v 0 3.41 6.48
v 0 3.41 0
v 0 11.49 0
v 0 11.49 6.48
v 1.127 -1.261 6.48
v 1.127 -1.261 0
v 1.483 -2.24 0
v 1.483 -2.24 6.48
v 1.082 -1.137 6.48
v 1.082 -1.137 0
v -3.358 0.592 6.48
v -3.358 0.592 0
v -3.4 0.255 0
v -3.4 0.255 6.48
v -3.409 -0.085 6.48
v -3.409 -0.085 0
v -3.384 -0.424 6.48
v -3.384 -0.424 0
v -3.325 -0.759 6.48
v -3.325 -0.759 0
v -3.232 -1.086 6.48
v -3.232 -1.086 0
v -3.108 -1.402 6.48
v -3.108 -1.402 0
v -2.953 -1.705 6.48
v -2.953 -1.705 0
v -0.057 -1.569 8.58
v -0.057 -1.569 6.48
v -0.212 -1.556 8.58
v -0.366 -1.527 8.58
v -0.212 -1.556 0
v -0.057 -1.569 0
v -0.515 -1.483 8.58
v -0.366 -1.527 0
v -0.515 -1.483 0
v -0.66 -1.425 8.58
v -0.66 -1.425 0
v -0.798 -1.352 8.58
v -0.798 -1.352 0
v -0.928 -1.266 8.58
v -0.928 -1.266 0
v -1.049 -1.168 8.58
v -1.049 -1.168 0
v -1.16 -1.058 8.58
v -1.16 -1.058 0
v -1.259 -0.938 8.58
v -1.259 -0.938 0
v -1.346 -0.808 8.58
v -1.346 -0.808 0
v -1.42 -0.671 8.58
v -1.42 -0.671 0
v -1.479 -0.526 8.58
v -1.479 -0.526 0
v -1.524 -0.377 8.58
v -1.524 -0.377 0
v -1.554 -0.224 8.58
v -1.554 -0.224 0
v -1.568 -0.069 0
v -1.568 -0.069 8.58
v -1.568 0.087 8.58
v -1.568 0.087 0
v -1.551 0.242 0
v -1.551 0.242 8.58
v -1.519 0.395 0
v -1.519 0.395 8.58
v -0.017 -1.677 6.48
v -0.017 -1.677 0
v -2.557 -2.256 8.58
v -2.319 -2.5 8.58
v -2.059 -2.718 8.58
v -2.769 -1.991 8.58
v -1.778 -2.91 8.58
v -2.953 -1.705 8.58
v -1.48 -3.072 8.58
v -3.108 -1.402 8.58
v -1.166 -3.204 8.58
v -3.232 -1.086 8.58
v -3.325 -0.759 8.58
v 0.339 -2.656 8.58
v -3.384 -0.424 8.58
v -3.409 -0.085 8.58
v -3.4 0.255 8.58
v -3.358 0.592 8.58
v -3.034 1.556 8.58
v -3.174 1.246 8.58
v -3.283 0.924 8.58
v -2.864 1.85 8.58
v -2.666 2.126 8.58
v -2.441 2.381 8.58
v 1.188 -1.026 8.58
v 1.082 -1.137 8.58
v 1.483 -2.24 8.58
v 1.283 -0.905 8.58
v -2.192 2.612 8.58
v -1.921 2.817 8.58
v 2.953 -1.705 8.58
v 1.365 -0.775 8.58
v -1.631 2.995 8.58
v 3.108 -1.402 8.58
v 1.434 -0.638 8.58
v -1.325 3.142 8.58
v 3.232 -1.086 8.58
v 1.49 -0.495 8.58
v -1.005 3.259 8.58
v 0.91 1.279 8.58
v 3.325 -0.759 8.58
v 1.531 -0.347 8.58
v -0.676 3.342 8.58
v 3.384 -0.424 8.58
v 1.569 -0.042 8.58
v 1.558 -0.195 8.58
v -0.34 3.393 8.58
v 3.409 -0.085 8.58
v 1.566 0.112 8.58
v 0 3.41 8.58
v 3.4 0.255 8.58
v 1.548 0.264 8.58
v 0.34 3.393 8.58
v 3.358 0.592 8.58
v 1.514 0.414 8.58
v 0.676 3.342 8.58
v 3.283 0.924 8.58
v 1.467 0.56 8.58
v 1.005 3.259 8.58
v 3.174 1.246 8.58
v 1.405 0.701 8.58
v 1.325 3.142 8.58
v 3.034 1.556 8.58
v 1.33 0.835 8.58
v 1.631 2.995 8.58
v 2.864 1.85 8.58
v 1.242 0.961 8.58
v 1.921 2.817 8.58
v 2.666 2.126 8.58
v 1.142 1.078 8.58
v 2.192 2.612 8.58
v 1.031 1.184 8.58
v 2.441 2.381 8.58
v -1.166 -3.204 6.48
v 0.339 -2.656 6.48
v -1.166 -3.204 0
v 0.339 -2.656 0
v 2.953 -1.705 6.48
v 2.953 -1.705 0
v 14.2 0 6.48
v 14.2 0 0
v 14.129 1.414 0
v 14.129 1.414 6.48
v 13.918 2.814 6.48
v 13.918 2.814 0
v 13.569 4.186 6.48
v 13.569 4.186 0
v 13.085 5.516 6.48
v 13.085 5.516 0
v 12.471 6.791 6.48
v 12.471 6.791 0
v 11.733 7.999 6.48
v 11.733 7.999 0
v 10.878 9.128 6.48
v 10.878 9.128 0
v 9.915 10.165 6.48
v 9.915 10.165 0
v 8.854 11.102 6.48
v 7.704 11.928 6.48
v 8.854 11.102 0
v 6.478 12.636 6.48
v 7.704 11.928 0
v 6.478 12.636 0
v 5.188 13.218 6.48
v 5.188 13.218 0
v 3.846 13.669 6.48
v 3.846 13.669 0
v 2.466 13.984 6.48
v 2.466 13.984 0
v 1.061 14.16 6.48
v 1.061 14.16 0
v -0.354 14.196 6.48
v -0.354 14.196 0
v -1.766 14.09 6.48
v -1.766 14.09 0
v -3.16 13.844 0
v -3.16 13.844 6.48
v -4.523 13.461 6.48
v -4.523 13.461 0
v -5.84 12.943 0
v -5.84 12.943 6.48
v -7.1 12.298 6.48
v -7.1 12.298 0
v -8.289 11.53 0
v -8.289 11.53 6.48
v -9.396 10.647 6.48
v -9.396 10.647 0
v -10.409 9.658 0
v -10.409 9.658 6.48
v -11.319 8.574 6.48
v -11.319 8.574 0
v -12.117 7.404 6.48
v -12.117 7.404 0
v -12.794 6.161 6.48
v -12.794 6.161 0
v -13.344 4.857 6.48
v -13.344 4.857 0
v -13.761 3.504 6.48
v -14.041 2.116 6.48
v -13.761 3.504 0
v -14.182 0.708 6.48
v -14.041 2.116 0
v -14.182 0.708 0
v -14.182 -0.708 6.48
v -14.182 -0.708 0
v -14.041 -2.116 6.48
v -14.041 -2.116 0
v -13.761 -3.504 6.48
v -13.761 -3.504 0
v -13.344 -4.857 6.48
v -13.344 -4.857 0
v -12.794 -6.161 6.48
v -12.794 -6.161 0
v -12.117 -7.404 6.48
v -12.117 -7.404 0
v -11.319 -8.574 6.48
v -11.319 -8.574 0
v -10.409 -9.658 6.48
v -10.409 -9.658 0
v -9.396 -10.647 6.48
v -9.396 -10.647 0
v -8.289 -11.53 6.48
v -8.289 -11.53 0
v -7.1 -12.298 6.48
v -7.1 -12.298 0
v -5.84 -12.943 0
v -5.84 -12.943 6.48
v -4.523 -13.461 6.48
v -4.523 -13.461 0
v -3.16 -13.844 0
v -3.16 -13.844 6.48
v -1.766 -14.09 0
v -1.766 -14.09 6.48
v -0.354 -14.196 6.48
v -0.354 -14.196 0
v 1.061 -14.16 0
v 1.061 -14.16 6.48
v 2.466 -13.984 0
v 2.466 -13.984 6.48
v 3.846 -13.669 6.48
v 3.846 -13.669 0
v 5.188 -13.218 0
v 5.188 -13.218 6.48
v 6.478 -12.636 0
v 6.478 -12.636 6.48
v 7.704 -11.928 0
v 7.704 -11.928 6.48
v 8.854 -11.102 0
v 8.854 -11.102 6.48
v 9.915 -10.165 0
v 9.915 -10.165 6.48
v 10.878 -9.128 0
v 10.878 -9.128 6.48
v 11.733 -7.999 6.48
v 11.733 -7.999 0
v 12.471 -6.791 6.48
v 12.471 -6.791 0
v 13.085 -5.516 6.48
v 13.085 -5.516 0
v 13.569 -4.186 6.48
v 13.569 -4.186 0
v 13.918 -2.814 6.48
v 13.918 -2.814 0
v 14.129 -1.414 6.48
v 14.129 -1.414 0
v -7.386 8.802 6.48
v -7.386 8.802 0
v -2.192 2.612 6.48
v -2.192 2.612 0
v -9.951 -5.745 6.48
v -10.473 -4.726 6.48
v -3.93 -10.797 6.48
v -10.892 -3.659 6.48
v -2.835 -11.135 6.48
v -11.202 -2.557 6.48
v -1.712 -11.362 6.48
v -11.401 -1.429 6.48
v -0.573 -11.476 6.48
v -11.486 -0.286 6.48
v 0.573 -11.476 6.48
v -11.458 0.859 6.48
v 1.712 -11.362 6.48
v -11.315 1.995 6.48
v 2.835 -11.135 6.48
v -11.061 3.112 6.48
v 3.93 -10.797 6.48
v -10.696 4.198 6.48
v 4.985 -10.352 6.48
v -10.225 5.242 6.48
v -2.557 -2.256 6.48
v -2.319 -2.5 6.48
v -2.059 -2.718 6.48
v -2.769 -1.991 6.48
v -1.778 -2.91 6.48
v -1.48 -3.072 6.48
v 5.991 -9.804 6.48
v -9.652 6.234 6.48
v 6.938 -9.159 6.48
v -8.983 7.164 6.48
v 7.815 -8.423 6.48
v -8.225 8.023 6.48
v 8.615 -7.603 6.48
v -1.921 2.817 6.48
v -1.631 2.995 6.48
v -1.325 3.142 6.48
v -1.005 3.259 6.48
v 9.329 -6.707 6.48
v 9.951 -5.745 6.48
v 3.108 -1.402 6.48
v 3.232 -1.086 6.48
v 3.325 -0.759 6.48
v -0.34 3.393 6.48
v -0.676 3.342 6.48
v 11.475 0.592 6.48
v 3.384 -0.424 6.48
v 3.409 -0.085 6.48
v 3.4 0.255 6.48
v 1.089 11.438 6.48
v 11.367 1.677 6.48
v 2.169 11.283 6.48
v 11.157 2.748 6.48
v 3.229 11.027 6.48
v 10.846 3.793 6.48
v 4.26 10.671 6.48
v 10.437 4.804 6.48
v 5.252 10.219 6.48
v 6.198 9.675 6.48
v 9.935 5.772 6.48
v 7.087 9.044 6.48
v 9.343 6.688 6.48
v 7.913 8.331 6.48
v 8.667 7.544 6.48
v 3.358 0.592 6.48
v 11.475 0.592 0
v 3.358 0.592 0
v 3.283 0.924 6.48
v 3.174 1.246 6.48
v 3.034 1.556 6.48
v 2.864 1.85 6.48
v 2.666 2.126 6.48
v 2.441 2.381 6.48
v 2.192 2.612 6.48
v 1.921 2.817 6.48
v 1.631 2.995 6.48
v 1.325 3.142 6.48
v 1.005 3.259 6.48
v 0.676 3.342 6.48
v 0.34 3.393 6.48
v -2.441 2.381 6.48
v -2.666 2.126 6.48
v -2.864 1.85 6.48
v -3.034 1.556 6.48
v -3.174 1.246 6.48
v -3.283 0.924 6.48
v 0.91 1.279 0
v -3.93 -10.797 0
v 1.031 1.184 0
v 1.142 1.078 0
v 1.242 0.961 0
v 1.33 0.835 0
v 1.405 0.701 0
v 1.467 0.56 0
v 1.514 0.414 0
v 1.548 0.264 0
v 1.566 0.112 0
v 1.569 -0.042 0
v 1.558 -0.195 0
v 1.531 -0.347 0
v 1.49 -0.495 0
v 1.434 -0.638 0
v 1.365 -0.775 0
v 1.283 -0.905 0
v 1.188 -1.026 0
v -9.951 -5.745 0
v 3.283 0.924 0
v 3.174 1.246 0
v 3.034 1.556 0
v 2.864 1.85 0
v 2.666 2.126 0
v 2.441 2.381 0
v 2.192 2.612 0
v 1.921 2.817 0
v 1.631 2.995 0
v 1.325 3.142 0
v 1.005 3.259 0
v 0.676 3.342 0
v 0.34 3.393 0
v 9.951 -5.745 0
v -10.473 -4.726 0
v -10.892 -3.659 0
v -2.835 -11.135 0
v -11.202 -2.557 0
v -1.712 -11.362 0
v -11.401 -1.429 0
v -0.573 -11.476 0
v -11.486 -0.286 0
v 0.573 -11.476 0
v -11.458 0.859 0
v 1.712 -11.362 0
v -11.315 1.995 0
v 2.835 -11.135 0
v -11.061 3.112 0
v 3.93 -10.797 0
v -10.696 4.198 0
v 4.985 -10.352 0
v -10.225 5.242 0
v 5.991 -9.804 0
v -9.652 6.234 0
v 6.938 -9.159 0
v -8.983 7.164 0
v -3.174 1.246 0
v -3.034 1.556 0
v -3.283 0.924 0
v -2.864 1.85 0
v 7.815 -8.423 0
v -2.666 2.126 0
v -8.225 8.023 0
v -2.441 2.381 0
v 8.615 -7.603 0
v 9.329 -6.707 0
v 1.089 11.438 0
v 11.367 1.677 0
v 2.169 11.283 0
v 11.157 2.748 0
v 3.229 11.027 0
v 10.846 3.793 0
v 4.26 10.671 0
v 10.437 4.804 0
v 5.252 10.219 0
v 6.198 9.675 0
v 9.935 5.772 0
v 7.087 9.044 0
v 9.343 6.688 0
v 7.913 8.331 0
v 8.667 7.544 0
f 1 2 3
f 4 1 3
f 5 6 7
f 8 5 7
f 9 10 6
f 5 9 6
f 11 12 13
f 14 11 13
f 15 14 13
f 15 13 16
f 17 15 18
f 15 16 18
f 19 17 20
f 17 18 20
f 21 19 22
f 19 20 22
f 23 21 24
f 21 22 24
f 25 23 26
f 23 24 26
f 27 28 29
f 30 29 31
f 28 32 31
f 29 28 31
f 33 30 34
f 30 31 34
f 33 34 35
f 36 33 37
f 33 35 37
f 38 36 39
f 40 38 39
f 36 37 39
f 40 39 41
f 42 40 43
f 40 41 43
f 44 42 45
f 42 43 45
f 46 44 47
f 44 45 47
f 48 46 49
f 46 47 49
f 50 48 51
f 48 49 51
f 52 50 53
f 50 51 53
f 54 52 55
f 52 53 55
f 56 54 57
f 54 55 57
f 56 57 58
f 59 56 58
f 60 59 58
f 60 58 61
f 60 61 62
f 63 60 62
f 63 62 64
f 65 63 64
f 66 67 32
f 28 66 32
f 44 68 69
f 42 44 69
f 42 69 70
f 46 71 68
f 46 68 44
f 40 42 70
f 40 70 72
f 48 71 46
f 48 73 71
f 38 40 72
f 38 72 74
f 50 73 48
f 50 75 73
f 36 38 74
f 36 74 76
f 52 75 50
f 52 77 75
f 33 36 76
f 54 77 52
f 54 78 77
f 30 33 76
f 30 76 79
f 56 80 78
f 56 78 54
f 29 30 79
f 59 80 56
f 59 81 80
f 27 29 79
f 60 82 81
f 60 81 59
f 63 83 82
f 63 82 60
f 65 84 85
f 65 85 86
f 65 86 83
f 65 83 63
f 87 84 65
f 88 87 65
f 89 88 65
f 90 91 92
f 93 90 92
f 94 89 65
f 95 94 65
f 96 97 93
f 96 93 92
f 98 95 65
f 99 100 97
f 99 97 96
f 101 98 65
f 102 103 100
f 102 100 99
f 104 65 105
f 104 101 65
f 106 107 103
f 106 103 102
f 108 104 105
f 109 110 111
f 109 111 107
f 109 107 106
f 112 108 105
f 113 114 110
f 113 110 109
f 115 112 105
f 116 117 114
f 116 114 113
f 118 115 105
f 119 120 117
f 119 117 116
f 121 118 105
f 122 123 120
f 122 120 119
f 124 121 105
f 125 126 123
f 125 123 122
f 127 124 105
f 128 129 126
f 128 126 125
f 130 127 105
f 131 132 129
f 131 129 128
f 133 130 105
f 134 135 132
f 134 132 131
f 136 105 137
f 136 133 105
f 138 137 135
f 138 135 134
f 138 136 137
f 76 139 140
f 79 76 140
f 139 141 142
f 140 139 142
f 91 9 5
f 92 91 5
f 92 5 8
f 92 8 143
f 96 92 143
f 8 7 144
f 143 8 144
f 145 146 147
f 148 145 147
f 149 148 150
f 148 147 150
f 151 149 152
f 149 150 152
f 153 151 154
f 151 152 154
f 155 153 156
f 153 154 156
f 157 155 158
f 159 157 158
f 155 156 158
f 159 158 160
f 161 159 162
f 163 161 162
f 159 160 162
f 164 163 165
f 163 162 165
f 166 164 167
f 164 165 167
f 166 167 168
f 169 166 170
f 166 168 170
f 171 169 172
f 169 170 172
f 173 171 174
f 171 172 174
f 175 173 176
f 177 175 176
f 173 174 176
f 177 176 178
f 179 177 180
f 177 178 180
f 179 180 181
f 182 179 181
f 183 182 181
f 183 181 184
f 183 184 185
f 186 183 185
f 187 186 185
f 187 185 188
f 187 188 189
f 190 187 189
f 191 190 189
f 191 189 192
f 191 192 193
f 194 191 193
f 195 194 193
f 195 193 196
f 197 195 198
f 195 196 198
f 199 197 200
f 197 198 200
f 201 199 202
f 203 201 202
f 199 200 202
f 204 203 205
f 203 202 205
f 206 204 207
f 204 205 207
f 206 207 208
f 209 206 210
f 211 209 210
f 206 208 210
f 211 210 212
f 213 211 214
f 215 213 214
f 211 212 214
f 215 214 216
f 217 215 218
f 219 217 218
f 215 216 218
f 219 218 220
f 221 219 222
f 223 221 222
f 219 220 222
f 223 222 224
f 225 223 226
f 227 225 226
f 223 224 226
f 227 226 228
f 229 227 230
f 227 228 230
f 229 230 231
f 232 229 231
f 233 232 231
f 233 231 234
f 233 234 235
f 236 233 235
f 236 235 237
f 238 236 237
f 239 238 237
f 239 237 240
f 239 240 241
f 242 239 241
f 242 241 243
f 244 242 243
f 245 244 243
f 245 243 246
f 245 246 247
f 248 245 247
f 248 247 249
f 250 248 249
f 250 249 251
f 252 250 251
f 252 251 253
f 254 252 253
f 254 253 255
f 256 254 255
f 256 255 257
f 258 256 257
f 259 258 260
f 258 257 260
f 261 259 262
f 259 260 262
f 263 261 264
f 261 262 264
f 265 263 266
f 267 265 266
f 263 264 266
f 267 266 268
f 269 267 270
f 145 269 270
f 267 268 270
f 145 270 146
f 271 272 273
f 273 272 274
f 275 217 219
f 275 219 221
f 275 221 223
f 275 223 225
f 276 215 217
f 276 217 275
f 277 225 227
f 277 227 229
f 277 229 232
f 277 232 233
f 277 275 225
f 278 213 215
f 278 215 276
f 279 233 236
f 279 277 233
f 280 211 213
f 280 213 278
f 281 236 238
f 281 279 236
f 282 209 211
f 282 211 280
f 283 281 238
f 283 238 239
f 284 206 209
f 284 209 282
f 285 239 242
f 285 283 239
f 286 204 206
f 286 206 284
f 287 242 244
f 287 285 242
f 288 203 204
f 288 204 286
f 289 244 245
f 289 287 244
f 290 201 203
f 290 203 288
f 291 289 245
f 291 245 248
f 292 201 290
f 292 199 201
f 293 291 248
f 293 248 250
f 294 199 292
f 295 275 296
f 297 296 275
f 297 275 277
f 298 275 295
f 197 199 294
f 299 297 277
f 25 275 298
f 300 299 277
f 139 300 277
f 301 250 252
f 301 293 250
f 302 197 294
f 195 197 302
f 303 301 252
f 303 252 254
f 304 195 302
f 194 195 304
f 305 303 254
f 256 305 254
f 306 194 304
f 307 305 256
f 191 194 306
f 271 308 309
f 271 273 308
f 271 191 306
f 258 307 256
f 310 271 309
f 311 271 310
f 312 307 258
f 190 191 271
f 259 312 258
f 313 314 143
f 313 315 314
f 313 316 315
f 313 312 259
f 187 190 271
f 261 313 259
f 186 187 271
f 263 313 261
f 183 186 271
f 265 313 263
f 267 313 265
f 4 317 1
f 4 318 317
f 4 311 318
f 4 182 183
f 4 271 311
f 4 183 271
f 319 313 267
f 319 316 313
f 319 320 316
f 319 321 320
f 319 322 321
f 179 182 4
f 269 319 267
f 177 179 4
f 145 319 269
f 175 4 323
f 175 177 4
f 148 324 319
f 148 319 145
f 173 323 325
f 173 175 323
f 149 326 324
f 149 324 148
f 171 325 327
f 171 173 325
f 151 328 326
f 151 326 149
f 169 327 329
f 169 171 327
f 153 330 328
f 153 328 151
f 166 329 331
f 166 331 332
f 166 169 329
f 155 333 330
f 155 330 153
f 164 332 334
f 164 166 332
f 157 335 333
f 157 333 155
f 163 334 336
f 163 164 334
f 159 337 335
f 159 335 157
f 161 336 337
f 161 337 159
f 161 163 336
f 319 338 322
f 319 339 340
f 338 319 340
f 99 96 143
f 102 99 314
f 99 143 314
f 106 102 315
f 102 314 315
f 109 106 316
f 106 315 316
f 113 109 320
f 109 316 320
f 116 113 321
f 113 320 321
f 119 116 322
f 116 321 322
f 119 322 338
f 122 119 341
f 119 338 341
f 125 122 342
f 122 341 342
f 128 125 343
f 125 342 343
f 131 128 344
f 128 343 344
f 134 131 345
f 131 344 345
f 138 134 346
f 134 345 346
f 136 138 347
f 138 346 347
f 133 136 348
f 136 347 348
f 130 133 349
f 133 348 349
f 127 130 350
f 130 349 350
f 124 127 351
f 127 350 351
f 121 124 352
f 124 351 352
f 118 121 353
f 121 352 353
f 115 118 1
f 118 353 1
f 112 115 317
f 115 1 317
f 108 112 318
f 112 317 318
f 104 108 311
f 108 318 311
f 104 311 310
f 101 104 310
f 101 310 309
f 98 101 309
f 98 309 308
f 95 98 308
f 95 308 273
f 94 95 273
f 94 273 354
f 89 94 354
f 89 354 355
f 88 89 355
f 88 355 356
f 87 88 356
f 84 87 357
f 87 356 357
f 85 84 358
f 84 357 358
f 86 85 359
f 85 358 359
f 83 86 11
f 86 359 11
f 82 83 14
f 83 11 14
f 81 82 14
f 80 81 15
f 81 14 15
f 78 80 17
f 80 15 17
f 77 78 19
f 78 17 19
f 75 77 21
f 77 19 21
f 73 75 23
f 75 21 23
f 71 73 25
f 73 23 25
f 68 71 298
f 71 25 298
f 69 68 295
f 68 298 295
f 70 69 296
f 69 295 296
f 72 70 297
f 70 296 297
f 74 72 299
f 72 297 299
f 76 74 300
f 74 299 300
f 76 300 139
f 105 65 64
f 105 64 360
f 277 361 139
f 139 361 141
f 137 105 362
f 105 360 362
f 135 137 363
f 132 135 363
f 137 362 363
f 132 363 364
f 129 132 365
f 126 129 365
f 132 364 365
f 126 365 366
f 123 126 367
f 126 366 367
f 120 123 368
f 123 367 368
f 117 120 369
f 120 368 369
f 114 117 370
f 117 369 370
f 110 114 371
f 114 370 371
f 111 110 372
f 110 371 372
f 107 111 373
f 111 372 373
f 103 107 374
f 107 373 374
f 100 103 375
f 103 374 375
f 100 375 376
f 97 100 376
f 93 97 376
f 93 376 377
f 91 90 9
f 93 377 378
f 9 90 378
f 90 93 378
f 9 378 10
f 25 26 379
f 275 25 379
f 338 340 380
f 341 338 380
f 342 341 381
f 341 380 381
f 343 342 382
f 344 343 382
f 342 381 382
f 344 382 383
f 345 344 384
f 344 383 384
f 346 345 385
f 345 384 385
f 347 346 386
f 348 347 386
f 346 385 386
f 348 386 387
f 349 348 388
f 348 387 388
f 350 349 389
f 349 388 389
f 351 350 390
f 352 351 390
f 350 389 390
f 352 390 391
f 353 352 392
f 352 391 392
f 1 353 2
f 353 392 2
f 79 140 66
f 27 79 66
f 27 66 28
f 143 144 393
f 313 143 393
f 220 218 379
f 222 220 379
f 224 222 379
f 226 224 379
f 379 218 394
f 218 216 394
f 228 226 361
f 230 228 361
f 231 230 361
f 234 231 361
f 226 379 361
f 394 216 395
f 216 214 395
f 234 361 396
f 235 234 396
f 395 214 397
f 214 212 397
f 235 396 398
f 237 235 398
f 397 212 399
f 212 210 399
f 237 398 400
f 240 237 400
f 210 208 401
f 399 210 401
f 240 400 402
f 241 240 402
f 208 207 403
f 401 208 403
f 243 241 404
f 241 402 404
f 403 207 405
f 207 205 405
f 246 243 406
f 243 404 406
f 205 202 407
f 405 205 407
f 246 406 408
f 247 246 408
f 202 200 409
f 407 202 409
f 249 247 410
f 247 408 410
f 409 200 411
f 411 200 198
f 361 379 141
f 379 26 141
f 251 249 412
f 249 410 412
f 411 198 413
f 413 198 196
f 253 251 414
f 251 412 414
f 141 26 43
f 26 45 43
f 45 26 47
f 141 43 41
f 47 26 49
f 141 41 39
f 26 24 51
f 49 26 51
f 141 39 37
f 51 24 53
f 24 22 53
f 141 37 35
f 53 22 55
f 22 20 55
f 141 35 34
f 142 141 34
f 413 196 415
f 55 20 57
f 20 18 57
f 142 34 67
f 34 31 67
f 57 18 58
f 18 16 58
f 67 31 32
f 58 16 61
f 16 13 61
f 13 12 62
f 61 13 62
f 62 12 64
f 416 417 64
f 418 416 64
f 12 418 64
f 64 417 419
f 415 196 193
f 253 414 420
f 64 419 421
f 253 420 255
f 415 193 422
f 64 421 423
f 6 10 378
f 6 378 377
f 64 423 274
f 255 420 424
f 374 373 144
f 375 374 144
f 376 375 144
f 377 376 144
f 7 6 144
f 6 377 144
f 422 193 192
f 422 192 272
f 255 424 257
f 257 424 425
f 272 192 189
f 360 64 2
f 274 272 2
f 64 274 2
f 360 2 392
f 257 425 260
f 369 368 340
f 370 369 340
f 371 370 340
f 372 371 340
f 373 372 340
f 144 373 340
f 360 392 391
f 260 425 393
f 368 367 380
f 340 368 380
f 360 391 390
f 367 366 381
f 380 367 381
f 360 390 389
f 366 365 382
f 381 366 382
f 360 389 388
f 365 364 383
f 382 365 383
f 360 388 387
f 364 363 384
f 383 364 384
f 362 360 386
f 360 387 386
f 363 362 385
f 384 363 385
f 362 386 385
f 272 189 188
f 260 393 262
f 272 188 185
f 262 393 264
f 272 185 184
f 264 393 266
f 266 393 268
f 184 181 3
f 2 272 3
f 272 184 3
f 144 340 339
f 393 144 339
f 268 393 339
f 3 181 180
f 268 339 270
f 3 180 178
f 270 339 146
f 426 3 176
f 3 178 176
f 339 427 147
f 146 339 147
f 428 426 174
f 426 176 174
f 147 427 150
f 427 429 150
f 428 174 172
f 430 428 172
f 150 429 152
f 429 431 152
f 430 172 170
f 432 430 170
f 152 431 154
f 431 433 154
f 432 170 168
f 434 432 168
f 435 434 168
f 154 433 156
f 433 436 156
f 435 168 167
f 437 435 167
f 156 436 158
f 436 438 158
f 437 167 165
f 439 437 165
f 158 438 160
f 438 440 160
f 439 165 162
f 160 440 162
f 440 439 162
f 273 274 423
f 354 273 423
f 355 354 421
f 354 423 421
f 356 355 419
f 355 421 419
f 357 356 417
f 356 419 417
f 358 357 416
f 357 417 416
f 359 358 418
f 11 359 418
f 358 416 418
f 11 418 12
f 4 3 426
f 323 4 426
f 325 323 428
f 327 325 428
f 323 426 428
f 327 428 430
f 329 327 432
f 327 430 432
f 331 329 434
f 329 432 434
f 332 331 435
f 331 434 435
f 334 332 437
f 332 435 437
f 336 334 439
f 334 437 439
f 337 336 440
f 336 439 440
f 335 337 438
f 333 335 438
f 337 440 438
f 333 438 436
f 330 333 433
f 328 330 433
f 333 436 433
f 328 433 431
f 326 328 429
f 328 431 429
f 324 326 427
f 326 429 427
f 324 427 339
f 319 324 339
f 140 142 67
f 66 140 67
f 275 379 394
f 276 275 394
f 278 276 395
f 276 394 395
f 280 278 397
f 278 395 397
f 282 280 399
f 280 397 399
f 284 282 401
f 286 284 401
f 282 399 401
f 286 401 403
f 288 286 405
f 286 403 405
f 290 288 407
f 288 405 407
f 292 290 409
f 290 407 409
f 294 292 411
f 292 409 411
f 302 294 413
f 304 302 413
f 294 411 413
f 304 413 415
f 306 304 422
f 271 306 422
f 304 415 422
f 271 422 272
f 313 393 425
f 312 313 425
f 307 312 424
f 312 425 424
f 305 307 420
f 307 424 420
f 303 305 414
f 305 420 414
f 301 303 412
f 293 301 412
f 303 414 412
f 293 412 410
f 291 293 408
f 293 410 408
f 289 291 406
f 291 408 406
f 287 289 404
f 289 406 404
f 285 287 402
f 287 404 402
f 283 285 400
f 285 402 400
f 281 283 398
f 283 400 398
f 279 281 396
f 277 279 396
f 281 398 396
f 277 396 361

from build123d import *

# Parameters (mm, degrees)
ESQUISSE2_R        = 14.2
BOSS_EXTRU_8_DEPTH = 6.48
BOSS_EXTRU_9_DEPTH = 2.1


with BuildPart() as part:
    # Esquisse2 → Boss.-Extru.8 (new body)
    with BuildSketch(Plane.XY):
        Circle(ESQUISSE2_R)
        with BuildLine():
            Line((1.483428969, -2.23993348), (2.953146627, -1.705))
            Line((2.953146627, -1.705), (9.950631889, -5.745))
            ThreePointArc((9.950631889, -5.745), (3.929811447, -10.797068213), (-3.929811447, -10.797068213))
            Line((-3.929811447, -10.797068213), (-1.166288689, -3.204351837))
            Line((-1.166288689, -3.204351837), (0.339010323, -2.656467803))
            Line((0.339010323, -2.656467803), (-0.017447021, -1.677109299))
            Line((-0.017447021, -1.677109299), (-0.056805783, -1.568971989))
            ThreePointArc((-0.056805783, -1.568971989), (-1.2591971, -0.93772206), (-1.519465743, 0.395125113))
            Line((-1.519465743, 0.395125113), (0.909996763, 1.27937715))
            ThreePointArc((0.909996763, 1.27937715), (1.566031564, 0.111557793), (1.082162789, -1.137463712))
            Line((1.082162789, -1.137463712), (1.126971625, -1.260574976))
            Line((1.126971625, -1.260574976), (1.483428969, -2.23993348))
        make_face(mode=Mode.SUBTRACT)
        with BuildLine():
            Line((-7.385629635, 8.801850651), (-2.191905749, 2.612211551))
            ThreePointArc((-2.191905749, 2.612211551), (-2.953146627, 1.705), (-3.358194438, 0.592140286))
            ThreePointArc((-3.358194438, 0.592140286), (-3.358194438, -0.592140286), (-2.953146627, -1.705))
            Line((-2.953146627, -1.705), (-9.950631889, -5.745))
            ThreePointArc((-9.950631889, -5.745), (-11.315441082, 1.995217561), (-7.385629635, 8.801850651))
        make_face(mode=Mode.SUBTRACT)
        with BuildLine():
            Line((0, 3.41), (0, 11.49))
            ThreePointArc((0, 11.49), (7.912534617, 8.331380194), (11.4747318, 0.592140286))
            Line((11.4747318, 0.592140286), (3.358194438, 0.592140286))
            ThreePointArc((3.358194438, 0.592140286), (2.191905749, 2.612211551), (0, 3.41))
        make_face(mode=Mode.SUBTRACT)
    extrude(amount=BOSS_EXTRU_8_DEPTH)

    # Esquisse6 → Boss.-Extru.9 (add)
    with BuildSketch(Plane.XY.offset(6.48)):
        with BuildLine():
            Line((-1.519465743, 0.395125113), (0.909996763, 1.27937715))
            ThreePointArc((0.909996763, 1.27937715), (1.566031564, 0.111557793), (1.082162789, -1.137463712))
            Line((1.082162789, -1.137463712), (1.483428969, -2.23993348))
            Line((1.483428969, -2.23993348), (2.953146627, -1.705))
            ThreePointArc((2.953146627, -1.705), (-1.166288689, 3.204351837), (-1.166288689, -3.204351837))
            Line((-1.166288689, -3.204351837), (0.339010323, -2.656467803))
            Line((0.339010323, -2.656467803), (-0.056805783, -1.568971989))
            ThreePointArc((-0.056805783, -1.568971989), (-1.2591971, -0.93772206), (-1.519465743, 0.395125113))
        make_face()
    extrude(amount=BOSS_EXTRU_9_DEPTH)


solid = part.part
